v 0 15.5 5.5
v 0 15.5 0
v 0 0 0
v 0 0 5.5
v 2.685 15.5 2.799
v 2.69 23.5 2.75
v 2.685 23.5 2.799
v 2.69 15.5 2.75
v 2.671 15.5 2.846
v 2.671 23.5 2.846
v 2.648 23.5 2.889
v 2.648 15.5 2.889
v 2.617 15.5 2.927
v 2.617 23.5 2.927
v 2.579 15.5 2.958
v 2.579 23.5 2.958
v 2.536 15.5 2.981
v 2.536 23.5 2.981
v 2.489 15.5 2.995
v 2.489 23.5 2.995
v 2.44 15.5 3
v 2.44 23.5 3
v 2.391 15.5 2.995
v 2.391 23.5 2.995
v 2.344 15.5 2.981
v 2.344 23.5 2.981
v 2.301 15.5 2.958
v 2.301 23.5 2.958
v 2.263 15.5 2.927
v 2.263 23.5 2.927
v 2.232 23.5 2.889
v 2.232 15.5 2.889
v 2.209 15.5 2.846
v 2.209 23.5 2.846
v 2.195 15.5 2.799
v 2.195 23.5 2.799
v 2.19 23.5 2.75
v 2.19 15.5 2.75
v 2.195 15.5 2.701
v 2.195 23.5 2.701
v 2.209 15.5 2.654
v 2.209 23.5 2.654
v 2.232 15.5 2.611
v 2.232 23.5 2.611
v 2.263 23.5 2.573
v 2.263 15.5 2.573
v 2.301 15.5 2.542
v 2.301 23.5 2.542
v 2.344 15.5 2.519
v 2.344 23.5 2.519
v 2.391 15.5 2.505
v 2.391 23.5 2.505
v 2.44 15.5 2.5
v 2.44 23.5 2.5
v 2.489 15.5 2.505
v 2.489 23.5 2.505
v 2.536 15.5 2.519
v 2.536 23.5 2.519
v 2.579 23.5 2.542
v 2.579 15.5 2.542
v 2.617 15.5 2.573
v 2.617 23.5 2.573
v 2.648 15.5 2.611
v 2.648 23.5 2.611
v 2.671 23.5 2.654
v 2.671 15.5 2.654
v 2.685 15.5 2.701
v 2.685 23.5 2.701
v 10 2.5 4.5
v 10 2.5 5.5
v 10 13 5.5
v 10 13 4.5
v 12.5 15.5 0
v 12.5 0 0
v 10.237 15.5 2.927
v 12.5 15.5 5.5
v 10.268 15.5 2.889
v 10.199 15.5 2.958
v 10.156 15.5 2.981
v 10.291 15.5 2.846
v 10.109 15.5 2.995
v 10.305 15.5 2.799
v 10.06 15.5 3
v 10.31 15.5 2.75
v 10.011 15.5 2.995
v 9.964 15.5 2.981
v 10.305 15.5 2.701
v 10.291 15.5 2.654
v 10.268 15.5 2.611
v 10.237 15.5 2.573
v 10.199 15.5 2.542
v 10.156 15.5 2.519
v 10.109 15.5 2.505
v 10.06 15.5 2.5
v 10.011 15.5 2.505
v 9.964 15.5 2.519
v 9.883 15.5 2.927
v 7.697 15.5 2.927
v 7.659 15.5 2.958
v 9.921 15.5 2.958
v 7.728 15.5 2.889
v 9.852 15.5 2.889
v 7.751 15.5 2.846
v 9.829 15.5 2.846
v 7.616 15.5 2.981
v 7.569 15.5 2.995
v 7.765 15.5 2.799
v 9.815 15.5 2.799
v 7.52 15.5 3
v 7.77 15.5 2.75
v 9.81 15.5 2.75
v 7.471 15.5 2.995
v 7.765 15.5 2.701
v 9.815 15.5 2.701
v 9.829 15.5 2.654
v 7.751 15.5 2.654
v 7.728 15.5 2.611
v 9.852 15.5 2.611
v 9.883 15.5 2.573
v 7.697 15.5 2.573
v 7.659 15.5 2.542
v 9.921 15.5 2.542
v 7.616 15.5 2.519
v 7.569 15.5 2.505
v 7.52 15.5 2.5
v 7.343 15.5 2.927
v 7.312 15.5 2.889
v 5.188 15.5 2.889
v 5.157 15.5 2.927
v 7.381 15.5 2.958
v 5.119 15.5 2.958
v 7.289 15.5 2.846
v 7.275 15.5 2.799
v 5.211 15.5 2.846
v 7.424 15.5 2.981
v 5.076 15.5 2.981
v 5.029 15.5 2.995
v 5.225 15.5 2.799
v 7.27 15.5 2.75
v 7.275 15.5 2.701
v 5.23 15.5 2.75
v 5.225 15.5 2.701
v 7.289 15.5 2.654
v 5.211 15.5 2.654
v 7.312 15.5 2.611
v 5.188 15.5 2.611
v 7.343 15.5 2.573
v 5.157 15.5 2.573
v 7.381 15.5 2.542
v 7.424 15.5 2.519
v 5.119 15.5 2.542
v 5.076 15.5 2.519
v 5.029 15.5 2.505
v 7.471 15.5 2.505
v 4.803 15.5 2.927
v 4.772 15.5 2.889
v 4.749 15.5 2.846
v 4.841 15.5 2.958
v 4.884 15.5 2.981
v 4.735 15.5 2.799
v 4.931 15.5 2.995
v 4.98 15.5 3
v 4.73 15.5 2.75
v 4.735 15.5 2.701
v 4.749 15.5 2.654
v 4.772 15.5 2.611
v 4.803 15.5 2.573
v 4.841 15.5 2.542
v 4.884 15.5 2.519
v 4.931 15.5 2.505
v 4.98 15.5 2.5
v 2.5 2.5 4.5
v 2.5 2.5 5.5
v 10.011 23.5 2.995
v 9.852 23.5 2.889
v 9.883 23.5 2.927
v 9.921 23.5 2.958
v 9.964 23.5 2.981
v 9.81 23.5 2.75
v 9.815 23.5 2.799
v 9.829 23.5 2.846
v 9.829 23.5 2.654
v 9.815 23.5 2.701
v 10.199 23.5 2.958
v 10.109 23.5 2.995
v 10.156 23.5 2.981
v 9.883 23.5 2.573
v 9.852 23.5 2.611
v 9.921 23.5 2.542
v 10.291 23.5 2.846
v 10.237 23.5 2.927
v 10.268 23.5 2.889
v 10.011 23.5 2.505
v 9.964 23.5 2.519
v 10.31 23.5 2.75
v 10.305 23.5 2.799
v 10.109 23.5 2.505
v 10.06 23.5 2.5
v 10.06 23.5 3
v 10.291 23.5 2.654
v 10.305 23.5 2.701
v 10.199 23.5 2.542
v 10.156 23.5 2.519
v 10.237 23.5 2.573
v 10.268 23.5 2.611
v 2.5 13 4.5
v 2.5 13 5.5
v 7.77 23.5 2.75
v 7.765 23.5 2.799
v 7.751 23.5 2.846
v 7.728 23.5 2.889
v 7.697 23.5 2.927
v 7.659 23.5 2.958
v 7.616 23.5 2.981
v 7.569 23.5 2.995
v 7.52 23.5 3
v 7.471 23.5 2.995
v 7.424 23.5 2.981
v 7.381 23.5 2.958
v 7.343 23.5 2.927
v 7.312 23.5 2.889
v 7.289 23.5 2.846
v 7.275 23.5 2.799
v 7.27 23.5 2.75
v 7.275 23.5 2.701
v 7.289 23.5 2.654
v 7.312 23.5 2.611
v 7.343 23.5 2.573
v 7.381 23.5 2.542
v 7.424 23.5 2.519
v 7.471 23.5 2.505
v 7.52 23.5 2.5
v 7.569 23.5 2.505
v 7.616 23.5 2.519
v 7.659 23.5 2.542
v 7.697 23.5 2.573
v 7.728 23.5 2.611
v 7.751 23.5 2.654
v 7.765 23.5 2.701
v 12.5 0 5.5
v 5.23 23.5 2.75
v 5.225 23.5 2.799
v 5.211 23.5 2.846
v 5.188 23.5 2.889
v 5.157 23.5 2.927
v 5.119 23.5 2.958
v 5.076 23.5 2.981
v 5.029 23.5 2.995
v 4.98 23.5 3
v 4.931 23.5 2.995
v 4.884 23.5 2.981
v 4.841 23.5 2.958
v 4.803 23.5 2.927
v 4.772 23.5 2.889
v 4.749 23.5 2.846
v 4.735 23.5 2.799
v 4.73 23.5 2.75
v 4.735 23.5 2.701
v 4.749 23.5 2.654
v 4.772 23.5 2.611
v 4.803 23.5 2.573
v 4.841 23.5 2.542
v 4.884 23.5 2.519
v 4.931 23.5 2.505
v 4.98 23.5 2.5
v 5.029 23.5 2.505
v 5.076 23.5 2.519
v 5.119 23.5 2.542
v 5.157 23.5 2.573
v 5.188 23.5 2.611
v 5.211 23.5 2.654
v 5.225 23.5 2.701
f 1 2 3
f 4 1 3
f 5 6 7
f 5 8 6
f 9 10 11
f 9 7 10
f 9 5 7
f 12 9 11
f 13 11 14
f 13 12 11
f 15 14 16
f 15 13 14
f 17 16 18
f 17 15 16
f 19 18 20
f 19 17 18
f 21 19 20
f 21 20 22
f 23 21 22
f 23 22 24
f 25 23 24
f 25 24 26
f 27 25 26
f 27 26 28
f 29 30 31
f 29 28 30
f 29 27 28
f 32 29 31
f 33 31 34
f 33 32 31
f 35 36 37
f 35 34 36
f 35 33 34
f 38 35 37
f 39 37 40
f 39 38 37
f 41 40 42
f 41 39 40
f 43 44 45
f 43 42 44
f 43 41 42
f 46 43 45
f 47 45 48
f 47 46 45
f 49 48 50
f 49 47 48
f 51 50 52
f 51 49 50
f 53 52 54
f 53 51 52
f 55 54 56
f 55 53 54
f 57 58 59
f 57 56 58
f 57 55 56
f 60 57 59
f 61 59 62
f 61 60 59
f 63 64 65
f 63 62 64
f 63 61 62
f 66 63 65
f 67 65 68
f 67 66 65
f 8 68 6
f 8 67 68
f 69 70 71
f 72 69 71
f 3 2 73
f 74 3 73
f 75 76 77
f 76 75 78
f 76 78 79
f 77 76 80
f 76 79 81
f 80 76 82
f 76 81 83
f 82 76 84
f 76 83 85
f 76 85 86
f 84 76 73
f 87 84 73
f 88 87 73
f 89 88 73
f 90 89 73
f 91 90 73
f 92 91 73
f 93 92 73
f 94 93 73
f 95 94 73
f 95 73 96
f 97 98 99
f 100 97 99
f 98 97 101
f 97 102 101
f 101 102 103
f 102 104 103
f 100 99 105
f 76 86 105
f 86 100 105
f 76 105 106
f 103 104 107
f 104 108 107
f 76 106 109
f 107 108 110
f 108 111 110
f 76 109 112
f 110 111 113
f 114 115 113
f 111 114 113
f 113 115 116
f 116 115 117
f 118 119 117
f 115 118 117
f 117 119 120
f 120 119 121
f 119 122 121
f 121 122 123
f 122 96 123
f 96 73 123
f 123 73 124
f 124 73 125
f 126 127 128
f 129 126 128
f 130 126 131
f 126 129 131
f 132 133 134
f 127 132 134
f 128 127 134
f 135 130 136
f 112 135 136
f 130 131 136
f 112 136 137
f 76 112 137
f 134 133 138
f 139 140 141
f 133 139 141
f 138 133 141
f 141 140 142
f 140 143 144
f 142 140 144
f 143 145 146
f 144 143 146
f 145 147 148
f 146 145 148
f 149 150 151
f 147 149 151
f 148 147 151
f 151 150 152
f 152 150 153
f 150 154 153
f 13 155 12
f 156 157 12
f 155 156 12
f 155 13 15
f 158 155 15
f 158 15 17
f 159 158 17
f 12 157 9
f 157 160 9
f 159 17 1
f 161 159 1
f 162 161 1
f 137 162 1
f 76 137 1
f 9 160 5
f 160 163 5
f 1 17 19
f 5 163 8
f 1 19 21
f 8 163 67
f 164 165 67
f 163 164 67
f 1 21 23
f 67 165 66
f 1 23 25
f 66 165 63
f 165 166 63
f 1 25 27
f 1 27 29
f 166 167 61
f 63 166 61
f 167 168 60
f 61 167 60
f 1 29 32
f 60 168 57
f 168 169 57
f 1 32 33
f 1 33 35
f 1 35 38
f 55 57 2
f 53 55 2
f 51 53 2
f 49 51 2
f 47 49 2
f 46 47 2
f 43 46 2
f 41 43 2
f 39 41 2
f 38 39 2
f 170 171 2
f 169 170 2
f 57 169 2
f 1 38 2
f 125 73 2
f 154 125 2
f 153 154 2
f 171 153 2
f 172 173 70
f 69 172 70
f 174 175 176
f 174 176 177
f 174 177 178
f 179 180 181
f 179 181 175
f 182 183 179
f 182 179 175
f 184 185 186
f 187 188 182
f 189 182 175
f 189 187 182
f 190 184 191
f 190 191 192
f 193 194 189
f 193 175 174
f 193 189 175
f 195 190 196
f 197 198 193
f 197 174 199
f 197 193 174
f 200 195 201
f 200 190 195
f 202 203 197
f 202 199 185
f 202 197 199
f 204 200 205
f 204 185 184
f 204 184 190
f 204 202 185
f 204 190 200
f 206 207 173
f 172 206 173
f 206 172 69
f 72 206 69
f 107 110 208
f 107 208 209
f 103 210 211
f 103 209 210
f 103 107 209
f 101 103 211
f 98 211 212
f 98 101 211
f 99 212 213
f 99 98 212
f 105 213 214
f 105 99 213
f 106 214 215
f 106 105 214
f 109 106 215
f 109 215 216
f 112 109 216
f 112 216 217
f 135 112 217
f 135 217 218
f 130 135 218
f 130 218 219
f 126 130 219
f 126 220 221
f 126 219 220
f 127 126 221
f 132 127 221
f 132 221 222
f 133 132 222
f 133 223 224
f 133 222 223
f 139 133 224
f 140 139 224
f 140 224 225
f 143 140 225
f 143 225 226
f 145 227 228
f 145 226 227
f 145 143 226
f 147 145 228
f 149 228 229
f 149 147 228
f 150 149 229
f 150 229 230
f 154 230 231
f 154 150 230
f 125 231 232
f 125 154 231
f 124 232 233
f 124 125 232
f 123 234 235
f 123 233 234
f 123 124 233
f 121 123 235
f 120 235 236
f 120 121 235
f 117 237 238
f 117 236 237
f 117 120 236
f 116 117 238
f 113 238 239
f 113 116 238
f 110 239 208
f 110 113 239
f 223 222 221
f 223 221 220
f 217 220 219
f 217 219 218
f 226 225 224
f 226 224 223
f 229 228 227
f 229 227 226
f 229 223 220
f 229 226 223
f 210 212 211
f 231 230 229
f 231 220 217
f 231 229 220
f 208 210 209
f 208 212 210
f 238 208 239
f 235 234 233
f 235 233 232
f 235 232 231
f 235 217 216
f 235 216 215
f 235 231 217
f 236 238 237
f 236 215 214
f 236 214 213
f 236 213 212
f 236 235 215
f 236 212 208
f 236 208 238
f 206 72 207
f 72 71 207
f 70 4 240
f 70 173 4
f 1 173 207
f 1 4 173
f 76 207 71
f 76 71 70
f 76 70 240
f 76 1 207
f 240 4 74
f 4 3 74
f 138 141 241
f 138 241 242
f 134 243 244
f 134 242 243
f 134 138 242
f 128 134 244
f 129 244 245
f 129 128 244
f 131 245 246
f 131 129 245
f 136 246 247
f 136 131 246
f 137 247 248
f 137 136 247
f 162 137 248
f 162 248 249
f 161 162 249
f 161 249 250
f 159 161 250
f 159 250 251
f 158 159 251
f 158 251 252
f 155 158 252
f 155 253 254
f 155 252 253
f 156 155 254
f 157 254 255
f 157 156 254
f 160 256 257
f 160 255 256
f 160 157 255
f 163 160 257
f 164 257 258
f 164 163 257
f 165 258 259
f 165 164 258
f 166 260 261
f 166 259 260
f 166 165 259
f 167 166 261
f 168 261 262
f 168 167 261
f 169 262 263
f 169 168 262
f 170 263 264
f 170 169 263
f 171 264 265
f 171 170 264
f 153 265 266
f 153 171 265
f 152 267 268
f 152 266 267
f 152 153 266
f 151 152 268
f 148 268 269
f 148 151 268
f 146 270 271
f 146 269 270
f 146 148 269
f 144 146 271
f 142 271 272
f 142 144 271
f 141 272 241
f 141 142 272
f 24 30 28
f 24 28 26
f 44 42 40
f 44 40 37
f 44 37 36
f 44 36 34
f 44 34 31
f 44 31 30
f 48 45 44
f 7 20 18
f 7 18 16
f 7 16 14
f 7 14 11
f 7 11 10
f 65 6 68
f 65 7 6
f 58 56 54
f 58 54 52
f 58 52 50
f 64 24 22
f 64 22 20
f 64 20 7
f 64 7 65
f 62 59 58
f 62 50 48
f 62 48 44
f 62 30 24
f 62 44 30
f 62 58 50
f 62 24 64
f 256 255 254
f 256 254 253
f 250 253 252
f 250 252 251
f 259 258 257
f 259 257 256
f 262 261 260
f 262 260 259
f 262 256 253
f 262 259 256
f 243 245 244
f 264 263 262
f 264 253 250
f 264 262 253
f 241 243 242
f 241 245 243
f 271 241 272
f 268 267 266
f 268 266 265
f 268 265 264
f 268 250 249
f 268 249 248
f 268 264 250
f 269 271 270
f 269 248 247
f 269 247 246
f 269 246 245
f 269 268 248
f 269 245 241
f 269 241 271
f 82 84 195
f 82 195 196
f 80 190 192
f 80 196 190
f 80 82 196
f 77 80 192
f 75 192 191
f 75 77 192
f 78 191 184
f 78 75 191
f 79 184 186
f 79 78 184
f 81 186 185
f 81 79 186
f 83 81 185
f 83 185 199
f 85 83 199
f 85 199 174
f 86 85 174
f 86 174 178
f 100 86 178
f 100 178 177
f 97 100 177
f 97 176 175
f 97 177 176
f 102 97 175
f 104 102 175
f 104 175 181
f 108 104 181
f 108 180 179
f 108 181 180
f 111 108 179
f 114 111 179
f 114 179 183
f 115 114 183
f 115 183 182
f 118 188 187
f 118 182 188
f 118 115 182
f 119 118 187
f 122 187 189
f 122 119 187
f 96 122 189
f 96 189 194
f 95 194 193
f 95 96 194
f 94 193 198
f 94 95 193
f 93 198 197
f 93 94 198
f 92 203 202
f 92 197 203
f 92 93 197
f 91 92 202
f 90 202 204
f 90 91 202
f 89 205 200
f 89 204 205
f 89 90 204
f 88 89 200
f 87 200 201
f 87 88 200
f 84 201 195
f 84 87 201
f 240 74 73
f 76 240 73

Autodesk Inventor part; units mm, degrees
ref_plane "YZ Plane" through (0, 0, 0) normal (1, 0, 0) x (0, 1, 0)
ref_plane "XZ Plane" through (0, 0, 0) normal (0, 1, 0) x (-1, 0, 0)
ref_plane "XY Plane" through (0, 0, 0) normal (0, 0, 1) x (1, 0, 0)
sketch "Sketch1" plane through (0, 0, 0) normal (0, 0, 1) x (1, 0, 0)
  line L0 (0, 0) -> (12.5, 0)
  line L1 (12.5, 0) -> (12.5, 15.5)
  line L2 (12.5, 15.5) -> (0, 15.5)
  line L3 (0, 15.5) -> (0, 0)
  dimension "d0" = 12.5
  dimension "d1" = 15.5
extrude "Extrusion1" add sketch "Sketch1" along normal blind 5.5
sketch "Sketch3" plane through (0, 0, 5.5) normal (0, 0, 1) x (1, 0, 0)
  line L0 (2.5, 2.5) -> (10, 2.5)
  line L1 (10, 2.5) -> (10, 13)
  line L2 (10, 13) -> (2.5, 13)
  line L3 (2.5, 13) -> (2.5, 2.5)
  point P0 (0, 0)
  point P1 (12, 0.5)
  point P2 (0.5, 15)
extrude "Extrusion3" cut sketch "Sketch3" against normal blind 1
sketch "Sketch5" plane through (0, 15.5, 0) normal (0, 1, 0) x (1, 0, 0)
  point P0 (0, 0)
sketch "Sketch7" plane through (0, 15.5, 0) normal (0, 1, 0) x (1, 0, 0)
  point P0 (0, 0)
sketch "Sketch8" plane through (0, 15.5, 0) normal (0, 1, 0) x (1, 0, 0)
  line L0 (0, -5.5) -> (12.5, -5.5) projected
  line L1 (0, 0) -> (12.5, 0)
  line L2 (12.5, 0) -> (12.5, -5.5)
  line L3 (12.5, -5.5) -> (0, -5.5)
  line L4 (0, -5.5) -> (0, 0)
  line L5 (0, 0) -> (0, -5.5) projected
  line L6 (12.5, 0) -> (12.5, -5.5) projected
  circle A0 centre (2.44, -2.75) radius 0.25
  circle A1 centre (4.98, -2.75) radius 0.25
  circle A2 centre (7.52, -2.75) radius 0.25
  circle A3 centre (10.06, -2.75) radius 0.25
  dimension "d49" = 0.5
  dimension "d50" = 0.5
  dimension "d51" = 0.5
  dimension "d52" = 0.5
extrude "Extrusion4" add sketch "Sketch8" along normal blind 8 contours A0 | A1 | A2 | A3
properties part number "DHT11"
